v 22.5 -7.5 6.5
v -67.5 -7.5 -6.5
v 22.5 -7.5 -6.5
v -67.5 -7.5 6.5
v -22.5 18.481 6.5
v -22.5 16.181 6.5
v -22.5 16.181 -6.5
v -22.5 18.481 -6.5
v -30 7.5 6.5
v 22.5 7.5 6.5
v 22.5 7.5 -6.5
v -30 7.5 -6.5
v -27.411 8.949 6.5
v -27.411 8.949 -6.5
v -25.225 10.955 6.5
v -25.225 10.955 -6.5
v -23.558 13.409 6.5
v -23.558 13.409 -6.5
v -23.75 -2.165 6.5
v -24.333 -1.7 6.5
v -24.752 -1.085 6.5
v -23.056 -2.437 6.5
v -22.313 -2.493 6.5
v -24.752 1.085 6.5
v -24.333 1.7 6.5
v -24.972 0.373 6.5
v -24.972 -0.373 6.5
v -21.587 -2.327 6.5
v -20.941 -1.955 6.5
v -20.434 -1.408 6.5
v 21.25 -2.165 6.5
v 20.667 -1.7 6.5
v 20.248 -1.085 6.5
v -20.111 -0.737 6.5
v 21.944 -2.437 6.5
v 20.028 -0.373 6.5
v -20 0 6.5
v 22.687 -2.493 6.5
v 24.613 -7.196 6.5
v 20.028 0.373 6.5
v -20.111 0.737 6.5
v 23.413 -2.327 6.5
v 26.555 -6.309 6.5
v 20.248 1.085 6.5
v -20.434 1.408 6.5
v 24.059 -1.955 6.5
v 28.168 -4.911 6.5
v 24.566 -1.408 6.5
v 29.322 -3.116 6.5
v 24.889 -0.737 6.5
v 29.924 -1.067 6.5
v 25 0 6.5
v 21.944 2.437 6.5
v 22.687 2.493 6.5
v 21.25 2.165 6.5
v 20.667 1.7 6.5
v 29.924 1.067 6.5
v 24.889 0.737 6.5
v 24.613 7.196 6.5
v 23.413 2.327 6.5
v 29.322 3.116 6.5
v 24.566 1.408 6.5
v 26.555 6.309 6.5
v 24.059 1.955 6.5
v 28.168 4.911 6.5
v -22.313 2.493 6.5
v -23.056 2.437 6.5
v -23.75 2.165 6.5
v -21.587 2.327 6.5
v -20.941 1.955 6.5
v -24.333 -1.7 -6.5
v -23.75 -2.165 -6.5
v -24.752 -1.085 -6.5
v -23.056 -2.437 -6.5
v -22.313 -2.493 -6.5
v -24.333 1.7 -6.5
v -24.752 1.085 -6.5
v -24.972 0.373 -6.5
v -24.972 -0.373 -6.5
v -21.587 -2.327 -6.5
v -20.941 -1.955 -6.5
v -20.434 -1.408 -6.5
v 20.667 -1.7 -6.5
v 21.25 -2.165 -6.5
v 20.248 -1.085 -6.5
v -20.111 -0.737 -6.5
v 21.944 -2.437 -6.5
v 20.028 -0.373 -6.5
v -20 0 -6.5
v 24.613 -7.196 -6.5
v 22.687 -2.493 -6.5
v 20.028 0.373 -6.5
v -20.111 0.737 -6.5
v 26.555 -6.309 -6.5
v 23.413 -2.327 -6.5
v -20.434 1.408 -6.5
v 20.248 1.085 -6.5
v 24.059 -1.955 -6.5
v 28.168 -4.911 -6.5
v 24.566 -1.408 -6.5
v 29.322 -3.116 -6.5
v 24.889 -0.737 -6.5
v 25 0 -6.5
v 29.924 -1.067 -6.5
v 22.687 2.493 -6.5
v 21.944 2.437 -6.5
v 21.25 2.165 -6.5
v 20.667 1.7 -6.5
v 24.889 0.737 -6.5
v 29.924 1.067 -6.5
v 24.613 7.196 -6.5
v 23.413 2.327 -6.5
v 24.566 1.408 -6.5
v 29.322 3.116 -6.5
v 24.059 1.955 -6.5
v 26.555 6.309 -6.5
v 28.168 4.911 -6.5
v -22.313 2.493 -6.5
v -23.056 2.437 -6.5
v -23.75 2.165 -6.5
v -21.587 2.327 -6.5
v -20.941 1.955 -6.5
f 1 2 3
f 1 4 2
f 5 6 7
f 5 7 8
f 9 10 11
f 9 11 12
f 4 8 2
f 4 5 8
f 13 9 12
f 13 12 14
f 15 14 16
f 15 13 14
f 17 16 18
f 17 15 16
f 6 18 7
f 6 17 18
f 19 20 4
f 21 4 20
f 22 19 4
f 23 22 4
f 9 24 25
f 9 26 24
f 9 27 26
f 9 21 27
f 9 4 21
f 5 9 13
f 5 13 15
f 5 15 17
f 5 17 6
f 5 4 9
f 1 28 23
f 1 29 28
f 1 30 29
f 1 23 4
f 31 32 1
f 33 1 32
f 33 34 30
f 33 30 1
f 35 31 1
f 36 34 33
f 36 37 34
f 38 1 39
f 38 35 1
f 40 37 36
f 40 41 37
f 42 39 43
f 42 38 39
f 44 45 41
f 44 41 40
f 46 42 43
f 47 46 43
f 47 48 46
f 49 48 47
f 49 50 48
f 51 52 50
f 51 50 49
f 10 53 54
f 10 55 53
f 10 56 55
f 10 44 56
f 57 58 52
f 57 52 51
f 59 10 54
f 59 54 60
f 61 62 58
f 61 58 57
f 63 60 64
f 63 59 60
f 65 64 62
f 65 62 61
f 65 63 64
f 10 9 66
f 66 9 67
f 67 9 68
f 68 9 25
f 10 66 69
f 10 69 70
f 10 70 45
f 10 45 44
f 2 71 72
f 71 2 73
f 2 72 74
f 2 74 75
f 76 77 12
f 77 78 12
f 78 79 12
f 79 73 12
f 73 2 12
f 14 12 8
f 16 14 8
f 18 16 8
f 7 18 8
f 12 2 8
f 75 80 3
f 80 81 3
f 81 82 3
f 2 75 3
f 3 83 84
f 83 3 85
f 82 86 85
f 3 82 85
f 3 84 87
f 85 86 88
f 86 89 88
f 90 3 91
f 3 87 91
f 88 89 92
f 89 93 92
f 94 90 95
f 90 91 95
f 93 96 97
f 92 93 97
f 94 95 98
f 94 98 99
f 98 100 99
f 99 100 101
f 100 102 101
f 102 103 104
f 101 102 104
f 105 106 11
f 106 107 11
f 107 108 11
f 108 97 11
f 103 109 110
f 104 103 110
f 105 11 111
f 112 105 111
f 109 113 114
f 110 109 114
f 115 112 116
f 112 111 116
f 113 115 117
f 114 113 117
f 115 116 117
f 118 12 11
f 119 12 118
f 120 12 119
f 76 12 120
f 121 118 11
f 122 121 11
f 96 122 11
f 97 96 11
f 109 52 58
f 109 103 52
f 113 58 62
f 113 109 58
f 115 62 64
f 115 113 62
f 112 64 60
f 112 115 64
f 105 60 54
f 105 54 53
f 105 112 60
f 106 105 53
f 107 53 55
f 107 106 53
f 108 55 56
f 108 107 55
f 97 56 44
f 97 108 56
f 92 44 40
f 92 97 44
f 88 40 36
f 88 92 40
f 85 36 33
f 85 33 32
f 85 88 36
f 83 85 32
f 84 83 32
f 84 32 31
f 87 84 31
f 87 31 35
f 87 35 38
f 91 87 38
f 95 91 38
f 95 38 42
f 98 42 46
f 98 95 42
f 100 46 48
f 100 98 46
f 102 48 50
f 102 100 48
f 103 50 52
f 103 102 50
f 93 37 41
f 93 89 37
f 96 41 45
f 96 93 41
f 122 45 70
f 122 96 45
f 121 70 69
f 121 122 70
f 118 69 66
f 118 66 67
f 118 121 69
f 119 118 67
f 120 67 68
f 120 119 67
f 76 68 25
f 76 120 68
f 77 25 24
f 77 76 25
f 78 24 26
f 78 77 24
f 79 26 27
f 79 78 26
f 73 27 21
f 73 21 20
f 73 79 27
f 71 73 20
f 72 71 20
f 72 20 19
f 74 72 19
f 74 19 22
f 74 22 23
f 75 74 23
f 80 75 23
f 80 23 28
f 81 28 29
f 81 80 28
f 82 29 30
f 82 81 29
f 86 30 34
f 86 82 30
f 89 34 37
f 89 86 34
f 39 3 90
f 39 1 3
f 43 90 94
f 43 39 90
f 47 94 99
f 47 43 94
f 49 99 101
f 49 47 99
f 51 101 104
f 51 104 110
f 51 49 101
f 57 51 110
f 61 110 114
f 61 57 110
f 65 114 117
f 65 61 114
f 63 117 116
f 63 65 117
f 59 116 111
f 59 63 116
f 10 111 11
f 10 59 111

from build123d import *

# Parameters (mm, degrees)
SKETCH1_R           = 2.5
BOSS_EXTRUDE1_DEPTH = 6.5


with BuildPart() as part:
    # Sketch1 → Boss-Extrude1 (new, symmetric)
    with BuildSketch(Plane.XY):
        with BuildLine():
            ThreePointArc((22.5, -7.5), (30, 0), (22.5, 7.5))
            Line((22.5, 7.5), (-30, 7.5))
            ThreePointArc((-30, 7.5), (-25.225001549, 10.954803468), (-22.5, 16.180762114))
            Line((-22.5, 16.180762114), (-22.5, 18.480762114))
            Line((-22.5, 18.480762114), (-67.5, -7.5))
            Line((-67.5, -7.5), (22.5, -7.5))
        make_face()
        with Locations((-22.5, 0)):
            Circle(SKETCH1_R, mode=Mode.SUBTRACT)
        with Locations((22.5, 0)):
            Circle(SKETCH1_R, mode=Mode.SUBTRACT)
    extrude(amount=BOSS_EXTRUDE1_DEPTH, both=True)


solid = part.part
